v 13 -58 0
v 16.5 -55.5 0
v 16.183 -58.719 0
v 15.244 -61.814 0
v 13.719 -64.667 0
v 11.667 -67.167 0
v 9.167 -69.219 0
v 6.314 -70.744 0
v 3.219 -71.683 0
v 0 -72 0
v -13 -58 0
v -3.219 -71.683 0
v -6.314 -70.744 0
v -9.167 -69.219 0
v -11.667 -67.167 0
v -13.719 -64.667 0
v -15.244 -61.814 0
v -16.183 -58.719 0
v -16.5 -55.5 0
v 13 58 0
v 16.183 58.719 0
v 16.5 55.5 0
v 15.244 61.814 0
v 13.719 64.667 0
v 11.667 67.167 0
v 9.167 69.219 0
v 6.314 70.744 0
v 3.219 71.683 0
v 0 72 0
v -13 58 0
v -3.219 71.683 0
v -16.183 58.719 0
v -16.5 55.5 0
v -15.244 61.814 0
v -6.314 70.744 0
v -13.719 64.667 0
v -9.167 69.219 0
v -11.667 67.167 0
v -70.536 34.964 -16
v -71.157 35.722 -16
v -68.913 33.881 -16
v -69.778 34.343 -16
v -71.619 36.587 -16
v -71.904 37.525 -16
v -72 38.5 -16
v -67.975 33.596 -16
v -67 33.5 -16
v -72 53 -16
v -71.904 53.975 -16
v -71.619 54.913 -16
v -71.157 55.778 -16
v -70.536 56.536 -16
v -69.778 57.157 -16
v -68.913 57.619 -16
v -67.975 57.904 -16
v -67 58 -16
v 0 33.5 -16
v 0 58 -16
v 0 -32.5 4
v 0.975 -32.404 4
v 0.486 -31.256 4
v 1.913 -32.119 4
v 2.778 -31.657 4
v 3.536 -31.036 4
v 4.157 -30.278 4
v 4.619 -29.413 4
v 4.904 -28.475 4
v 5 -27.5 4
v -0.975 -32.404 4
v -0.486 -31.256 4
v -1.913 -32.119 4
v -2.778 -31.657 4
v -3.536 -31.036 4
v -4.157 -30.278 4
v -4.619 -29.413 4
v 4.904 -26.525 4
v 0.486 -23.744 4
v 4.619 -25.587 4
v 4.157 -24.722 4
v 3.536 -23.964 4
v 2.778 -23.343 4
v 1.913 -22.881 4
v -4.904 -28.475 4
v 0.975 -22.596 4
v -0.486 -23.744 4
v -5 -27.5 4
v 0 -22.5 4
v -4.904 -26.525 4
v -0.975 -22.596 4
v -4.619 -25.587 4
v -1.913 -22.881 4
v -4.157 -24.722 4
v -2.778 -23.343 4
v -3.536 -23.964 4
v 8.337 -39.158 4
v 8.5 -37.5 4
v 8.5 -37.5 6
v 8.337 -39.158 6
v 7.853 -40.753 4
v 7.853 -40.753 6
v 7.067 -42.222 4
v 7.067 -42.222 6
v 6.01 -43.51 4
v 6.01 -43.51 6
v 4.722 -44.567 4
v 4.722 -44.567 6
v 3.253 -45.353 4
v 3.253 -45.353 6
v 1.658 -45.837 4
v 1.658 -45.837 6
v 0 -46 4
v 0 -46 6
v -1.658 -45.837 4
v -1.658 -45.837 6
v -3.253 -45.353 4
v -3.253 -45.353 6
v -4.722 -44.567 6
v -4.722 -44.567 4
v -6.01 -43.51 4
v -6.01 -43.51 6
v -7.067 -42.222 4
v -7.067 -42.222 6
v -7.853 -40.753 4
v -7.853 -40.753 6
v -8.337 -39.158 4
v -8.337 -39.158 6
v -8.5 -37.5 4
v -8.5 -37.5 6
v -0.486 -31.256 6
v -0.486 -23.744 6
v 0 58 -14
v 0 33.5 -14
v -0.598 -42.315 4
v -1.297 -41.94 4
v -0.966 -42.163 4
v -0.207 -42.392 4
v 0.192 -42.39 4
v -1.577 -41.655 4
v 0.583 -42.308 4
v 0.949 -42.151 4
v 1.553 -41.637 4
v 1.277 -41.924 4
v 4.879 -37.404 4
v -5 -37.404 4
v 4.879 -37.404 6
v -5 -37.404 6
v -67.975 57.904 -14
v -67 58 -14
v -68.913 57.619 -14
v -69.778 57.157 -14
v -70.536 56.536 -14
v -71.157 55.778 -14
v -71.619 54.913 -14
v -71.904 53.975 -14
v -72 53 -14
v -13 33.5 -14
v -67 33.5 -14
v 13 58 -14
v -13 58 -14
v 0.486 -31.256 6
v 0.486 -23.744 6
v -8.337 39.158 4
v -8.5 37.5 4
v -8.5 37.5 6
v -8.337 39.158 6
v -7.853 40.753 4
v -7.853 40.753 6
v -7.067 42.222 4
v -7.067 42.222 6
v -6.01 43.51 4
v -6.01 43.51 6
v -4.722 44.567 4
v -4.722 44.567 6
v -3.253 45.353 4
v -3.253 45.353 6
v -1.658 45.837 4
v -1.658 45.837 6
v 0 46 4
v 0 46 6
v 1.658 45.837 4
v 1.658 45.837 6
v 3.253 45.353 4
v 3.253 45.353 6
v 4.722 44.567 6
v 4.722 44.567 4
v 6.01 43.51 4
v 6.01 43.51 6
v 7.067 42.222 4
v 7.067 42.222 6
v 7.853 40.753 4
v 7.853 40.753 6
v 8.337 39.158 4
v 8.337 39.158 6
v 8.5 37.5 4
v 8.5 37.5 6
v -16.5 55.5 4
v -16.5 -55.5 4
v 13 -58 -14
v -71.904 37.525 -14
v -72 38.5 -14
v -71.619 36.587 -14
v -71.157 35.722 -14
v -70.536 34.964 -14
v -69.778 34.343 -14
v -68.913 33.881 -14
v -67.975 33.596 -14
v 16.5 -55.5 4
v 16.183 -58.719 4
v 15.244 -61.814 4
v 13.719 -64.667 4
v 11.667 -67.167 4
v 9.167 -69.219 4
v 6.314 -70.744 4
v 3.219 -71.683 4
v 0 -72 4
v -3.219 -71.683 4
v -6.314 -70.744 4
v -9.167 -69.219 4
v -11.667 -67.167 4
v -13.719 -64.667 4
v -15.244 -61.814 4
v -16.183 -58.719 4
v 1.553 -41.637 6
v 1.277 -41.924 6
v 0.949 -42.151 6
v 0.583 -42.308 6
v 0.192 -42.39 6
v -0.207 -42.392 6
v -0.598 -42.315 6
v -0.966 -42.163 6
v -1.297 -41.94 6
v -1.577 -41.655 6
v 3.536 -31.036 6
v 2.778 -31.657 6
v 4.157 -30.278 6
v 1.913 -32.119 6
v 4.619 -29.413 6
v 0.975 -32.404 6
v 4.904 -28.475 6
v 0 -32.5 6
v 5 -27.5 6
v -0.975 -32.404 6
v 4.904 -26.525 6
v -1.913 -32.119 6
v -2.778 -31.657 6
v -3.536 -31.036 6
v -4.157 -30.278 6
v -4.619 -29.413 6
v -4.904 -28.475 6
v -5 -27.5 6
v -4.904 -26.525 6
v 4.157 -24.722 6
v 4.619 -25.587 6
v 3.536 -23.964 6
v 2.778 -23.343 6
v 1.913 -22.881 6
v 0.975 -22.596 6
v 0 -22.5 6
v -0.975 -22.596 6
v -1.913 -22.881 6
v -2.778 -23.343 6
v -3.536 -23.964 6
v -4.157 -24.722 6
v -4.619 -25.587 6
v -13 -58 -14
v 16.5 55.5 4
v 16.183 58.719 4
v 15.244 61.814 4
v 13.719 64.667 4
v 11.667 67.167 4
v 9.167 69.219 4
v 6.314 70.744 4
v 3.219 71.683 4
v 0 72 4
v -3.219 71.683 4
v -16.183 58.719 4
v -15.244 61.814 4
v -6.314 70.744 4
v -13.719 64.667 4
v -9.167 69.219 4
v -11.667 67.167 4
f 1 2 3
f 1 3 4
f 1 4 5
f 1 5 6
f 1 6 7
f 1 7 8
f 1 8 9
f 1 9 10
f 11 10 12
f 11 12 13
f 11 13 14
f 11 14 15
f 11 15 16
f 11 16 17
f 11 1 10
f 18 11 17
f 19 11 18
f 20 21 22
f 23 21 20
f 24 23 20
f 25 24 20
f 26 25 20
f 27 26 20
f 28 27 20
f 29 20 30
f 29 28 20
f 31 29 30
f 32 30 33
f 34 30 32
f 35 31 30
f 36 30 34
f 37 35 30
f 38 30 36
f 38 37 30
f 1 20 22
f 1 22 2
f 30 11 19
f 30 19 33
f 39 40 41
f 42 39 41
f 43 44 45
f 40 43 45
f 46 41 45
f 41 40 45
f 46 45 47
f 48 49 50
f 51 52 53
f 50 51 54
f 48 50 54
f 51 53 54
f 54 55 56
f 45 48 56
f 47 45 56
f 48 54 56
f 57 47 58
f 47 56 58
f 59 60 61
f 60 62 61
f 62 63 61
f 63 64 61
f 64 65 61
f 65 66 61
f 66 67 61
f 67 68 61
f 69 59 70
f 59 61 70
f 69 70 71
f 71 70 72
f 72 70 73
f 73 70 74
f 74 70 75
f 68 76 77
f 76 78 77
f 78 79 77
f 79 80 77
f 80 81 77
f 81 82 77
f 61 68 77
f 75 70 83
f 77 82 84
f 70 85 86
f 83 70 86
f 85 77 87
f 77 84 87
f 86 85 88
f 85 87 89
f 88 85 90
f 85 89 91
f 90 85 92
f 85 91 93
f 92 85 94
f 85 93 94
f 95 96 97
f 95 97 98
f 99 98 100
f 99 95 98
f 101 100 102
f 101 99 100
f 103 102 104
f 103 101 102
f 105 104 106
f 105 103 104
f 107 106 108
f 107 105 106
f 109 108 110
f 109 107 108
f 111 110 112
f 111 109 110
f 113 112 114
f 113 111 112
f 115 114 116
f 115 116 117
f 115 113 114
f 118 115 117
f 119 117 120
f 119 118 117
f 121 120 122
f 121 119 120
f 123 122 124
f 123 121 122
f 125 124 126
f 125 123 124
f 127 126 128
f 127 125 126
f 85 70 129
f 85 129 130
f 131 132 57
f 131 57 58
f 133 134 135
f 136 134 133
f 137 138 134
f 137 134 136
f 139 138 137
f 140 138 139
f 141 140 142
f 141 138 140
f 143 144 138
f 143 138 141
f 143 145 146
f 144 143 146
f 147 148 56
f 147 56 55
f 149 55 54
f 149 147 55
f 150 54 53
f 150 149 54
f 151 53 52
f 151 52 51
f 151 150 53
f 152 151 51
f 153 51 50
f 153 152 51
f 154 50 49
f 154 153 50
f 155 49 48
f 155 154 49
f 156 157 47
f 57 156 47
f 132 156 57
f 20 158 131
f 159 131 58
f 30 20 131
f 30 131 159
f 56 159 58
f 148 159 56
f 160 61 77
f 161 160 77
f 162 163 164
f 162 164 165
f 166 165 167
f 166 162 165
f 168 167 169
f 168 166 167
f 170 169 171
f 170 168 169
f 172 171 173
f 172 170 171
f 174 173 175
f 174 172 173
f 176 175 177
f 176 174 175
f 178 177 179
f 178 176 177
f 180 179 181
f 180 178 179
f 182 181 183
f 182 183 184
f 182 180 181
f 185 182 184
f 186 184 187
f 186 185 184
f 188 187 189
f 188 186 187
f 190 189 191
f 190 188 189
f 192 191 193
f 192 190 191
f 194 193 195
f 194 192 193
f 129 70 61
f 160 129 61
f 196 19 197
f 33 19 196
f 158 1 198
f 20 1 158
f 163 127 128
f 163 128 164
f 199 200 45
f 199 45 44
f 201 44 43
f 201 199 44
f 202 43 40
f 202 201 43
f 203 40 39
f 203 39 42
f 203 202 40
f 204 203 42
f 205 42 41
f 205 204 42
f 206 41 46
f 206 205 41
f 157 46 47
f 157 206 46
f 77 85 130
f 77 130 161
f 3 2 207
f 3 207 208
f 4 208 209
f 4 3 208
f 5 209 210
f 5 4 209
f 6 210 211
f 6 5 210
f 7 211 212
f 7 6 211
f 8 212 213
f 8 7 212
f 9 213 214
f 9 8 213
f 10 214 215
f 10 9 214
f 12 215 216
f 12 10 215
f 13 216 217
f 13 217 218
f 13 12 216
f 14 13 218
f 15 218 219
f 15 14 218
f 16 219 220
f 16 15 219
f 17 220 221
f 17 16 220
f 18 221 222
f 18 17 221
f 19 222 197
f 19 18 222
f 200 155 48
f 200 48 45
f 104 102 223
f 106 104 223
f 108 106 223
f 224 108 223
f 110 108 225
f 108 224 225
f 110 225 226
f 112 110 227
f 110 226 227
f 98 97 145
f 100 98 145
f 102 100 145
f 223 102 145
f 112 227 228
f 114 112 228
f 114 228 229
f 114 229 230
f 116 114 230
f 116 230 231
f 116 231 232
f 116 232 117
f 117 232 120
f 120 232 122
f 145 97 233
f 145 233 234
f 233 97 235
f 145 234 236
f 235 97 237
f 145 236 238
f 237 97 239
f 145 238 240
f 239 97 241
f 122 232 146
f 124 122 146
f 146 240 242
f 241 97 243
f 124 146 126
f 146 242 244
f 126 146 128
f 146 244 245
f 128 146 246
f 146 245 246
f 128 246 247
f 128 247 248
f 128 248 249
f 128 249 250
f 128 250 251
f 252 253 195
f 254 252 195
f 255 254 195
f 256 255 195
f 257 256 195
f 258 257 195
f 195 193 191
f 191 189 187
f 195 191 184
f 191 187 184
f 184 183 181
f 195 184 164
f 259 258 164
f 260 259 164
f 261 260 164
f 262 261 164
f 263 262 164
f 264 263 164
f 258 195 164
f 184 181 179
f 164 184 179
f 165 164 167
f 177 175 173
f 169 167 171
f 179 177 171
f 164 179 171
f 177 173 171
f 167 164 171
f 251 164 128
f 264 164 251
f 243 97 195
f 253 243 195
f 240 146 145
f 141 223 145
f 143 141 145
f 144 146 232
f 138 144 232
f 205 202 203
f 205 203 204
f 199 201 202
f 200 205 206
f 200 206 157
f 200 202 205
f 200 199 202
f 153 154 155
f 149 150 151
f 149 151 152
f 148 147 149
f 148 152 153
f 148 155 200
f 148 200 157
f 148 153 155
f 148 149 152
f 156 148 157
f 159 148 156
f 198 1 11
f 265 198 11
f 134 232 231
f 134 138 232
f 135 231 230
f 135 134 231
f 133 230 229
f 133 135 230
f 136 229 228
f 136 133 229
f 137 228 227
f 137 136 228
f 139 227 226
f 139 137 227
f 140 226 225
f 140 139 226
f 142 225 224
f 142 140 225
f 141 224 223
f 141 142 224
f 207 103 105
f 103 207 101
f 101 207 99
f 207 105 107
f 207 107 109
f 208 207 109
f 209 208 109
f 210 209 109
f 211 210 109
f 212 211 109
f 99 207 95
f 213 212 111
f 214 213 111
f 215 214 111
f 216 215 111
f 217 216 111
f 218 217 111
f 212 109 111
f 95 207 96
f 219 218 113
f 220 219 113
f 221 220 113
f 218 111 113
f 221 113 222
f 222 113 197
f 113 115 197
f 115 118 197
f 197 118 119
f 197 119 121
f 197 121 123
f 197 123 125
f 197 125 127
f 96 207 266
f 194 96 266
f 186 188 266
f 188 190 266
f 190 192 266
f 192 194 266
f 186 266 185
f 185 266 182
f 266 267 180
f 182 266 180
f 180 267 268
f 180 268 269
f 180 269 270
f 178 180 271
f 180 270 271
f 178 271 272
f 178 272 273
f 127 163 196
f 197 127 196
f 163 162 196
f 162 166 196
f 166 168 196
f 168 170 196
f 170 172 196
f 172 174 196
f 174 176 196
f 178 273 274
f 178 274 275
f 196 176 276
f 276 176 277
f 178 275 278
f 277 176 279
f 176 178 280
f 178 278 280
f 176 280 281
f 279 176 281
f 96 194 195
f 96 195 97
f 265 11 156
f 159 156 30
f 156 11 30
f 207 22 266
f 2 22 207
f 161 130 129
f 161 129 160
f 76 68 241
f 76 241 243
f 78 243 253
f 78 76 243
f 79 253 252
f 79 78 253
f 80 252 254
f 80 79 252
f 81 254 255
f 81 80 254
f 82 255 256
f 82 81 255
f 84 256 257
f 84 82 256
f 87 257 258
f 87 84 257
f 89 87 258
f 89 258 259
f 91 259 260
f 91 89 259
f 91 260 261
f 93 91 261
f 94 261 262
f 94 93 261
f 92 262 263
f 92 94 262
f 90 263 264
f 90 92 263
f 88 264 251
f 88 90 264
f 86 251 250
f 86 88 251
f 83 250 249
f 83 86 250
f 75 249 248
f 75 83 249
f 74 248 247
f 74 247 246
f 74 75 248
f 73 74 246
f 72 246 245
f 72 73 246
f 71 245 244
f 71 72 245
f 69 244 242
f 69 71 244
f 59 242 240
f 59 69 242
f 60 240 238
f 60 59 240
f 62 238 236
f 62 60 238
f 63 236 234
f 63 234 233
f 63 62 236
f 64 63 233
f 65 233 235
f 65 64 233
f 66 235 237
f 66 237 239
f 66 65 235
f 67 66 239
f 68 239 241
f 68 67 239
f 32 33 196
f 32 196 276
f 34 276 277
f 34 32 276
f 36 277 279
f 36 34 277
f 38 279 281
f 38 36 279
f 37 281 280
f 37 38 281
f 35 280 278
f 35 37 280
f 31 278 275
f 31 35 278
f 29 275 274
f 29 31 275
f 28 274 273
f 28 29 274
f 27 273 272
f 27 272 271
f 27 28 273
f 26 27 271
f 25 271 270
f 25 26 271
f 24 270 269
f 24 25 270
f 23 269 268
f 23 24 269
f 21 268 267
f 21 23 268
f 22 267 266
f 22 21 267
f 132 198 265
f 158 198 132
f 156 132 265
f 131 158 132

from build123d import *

# Parameters (mm, degrees)
EXTRUDE_1_DEPTH     = 4
SKETCH_2_R          = 5
EXTRUDE_2_DEPTH     = 2
SKETCH_3_W          = 0.972791726
SKETCH_3_H          = 7.511993454
EXTRUDE_3_DEPTH     = 2
CUT_EXTRUDE_1_DEPTH = 2
FILLET_1_R          = 2
SKETCH_5_W          = 26
SKETCH_5_H          = 116
EXTRUDE_4_DEPTH     = 14
EXTRUDE_5_DEPTH     = 2


with BuildPart() as part:
    # 草图1 → 凸台-拉伸1 (new body)
    with BuildSketch(Plane.XY):
        with BuildLine():
            Line((-16.5, -55.5), (-16.5, 55.5))
            ThreePointArc((-16.5, 55.5), (0, 72), (16.5, 55.5))
            Line((16.5, 55.5), (16.5, -55.5))
            ThreePointArc((16.5, -55.5), (0, -72), (-16.5, -55.5))
        make_face()
    extrude(amount=EXTRUDE_1_DEPTH)

    # 草图2 → 凸台-拉伸2 (add)
    with BuildSketch(Plane.XY.offset(4)):
        with BuildLine():
            Line((-8.5, -37.5), (-8.5, 37.5))
            ThreePointArc((-8.5, 37.5), (0, 46), (8.5, 37.5))
            Line((8.5, 37.5), (8.5, -37.5))
            ThreePointArc((8.5, -37.5), (0, -46), (-8.5, -37.5))
        make_face()
        with Locations((0, -27.5)):
            Circle(SKETCH_2_R, mode=Mode.SUBTRACT)
    extrude(amount=EXTRUDE_2_DEPTH)

    # 草图3 → 凸台-拉伸3 (add)
    with BuildSketch(Plane.XY.offset(4)):
        with Locations((0, -27.5)):
            Rectangle(SKETCH_3_W, SKETCH_3_H)
    extrude(amount=EXTRUDE_3_DEPTH)

    # 草图4 → 切除-拉伸1 (cut)
    with BuildSketch(Plane.XY.offset(6)):
        Polygon((0, -43.613819341), (4.879446047, -37.404094744), (-5, -37.404094744), align=None)
    extrude(amount=-CUT_EXTRUDE_1_DEPTH, mode=Mode.SUBTRACT)

    # 圆角1
    fillet_1_edges = [part.edges().sort_by_distance(p)[0] for p in [
        (0, -43.613819341, 5),
    ]]
    fillet(fillet_1_edges, radius=FILLET_1_R)

    # 草图5 → 凸台-拉伸4 (add)
    with BuildSketch(Plane(origin=(0, 0, 0), x_dir=(-1, 0, 0), z_dir=(0, 0, -1))):
        Rectangle(SKETCH_5_W, SKETCH_5_H)
    extrude(amount=EXTRUDE_4_DEPTH)

    # 草图6 → 凸台-拉伸5 (add)
    with BuildSketch(Plane(origin=(0, 0, -14), x_dir=(-1, 0, 0), z_dir=(0, 0, -1))):
        with BuildLine():
            Line((0, 58), (67, 58))
            ThreePointArc((67, 58), (70.535533906, 56.535533906), (72, 53))
            Line((72, 53), (72, 38.5))
            ThreePointArc((72, 38.5), (70.535533906, 34.964466094), (67, 33.5))
            Line((67, 33.5), (0, 33.5))
            Line((0, 33.5), (0, 58))
        make_face()
    extrude(amount=EXTRUDE_5_DEPTH)


solid = part.part
